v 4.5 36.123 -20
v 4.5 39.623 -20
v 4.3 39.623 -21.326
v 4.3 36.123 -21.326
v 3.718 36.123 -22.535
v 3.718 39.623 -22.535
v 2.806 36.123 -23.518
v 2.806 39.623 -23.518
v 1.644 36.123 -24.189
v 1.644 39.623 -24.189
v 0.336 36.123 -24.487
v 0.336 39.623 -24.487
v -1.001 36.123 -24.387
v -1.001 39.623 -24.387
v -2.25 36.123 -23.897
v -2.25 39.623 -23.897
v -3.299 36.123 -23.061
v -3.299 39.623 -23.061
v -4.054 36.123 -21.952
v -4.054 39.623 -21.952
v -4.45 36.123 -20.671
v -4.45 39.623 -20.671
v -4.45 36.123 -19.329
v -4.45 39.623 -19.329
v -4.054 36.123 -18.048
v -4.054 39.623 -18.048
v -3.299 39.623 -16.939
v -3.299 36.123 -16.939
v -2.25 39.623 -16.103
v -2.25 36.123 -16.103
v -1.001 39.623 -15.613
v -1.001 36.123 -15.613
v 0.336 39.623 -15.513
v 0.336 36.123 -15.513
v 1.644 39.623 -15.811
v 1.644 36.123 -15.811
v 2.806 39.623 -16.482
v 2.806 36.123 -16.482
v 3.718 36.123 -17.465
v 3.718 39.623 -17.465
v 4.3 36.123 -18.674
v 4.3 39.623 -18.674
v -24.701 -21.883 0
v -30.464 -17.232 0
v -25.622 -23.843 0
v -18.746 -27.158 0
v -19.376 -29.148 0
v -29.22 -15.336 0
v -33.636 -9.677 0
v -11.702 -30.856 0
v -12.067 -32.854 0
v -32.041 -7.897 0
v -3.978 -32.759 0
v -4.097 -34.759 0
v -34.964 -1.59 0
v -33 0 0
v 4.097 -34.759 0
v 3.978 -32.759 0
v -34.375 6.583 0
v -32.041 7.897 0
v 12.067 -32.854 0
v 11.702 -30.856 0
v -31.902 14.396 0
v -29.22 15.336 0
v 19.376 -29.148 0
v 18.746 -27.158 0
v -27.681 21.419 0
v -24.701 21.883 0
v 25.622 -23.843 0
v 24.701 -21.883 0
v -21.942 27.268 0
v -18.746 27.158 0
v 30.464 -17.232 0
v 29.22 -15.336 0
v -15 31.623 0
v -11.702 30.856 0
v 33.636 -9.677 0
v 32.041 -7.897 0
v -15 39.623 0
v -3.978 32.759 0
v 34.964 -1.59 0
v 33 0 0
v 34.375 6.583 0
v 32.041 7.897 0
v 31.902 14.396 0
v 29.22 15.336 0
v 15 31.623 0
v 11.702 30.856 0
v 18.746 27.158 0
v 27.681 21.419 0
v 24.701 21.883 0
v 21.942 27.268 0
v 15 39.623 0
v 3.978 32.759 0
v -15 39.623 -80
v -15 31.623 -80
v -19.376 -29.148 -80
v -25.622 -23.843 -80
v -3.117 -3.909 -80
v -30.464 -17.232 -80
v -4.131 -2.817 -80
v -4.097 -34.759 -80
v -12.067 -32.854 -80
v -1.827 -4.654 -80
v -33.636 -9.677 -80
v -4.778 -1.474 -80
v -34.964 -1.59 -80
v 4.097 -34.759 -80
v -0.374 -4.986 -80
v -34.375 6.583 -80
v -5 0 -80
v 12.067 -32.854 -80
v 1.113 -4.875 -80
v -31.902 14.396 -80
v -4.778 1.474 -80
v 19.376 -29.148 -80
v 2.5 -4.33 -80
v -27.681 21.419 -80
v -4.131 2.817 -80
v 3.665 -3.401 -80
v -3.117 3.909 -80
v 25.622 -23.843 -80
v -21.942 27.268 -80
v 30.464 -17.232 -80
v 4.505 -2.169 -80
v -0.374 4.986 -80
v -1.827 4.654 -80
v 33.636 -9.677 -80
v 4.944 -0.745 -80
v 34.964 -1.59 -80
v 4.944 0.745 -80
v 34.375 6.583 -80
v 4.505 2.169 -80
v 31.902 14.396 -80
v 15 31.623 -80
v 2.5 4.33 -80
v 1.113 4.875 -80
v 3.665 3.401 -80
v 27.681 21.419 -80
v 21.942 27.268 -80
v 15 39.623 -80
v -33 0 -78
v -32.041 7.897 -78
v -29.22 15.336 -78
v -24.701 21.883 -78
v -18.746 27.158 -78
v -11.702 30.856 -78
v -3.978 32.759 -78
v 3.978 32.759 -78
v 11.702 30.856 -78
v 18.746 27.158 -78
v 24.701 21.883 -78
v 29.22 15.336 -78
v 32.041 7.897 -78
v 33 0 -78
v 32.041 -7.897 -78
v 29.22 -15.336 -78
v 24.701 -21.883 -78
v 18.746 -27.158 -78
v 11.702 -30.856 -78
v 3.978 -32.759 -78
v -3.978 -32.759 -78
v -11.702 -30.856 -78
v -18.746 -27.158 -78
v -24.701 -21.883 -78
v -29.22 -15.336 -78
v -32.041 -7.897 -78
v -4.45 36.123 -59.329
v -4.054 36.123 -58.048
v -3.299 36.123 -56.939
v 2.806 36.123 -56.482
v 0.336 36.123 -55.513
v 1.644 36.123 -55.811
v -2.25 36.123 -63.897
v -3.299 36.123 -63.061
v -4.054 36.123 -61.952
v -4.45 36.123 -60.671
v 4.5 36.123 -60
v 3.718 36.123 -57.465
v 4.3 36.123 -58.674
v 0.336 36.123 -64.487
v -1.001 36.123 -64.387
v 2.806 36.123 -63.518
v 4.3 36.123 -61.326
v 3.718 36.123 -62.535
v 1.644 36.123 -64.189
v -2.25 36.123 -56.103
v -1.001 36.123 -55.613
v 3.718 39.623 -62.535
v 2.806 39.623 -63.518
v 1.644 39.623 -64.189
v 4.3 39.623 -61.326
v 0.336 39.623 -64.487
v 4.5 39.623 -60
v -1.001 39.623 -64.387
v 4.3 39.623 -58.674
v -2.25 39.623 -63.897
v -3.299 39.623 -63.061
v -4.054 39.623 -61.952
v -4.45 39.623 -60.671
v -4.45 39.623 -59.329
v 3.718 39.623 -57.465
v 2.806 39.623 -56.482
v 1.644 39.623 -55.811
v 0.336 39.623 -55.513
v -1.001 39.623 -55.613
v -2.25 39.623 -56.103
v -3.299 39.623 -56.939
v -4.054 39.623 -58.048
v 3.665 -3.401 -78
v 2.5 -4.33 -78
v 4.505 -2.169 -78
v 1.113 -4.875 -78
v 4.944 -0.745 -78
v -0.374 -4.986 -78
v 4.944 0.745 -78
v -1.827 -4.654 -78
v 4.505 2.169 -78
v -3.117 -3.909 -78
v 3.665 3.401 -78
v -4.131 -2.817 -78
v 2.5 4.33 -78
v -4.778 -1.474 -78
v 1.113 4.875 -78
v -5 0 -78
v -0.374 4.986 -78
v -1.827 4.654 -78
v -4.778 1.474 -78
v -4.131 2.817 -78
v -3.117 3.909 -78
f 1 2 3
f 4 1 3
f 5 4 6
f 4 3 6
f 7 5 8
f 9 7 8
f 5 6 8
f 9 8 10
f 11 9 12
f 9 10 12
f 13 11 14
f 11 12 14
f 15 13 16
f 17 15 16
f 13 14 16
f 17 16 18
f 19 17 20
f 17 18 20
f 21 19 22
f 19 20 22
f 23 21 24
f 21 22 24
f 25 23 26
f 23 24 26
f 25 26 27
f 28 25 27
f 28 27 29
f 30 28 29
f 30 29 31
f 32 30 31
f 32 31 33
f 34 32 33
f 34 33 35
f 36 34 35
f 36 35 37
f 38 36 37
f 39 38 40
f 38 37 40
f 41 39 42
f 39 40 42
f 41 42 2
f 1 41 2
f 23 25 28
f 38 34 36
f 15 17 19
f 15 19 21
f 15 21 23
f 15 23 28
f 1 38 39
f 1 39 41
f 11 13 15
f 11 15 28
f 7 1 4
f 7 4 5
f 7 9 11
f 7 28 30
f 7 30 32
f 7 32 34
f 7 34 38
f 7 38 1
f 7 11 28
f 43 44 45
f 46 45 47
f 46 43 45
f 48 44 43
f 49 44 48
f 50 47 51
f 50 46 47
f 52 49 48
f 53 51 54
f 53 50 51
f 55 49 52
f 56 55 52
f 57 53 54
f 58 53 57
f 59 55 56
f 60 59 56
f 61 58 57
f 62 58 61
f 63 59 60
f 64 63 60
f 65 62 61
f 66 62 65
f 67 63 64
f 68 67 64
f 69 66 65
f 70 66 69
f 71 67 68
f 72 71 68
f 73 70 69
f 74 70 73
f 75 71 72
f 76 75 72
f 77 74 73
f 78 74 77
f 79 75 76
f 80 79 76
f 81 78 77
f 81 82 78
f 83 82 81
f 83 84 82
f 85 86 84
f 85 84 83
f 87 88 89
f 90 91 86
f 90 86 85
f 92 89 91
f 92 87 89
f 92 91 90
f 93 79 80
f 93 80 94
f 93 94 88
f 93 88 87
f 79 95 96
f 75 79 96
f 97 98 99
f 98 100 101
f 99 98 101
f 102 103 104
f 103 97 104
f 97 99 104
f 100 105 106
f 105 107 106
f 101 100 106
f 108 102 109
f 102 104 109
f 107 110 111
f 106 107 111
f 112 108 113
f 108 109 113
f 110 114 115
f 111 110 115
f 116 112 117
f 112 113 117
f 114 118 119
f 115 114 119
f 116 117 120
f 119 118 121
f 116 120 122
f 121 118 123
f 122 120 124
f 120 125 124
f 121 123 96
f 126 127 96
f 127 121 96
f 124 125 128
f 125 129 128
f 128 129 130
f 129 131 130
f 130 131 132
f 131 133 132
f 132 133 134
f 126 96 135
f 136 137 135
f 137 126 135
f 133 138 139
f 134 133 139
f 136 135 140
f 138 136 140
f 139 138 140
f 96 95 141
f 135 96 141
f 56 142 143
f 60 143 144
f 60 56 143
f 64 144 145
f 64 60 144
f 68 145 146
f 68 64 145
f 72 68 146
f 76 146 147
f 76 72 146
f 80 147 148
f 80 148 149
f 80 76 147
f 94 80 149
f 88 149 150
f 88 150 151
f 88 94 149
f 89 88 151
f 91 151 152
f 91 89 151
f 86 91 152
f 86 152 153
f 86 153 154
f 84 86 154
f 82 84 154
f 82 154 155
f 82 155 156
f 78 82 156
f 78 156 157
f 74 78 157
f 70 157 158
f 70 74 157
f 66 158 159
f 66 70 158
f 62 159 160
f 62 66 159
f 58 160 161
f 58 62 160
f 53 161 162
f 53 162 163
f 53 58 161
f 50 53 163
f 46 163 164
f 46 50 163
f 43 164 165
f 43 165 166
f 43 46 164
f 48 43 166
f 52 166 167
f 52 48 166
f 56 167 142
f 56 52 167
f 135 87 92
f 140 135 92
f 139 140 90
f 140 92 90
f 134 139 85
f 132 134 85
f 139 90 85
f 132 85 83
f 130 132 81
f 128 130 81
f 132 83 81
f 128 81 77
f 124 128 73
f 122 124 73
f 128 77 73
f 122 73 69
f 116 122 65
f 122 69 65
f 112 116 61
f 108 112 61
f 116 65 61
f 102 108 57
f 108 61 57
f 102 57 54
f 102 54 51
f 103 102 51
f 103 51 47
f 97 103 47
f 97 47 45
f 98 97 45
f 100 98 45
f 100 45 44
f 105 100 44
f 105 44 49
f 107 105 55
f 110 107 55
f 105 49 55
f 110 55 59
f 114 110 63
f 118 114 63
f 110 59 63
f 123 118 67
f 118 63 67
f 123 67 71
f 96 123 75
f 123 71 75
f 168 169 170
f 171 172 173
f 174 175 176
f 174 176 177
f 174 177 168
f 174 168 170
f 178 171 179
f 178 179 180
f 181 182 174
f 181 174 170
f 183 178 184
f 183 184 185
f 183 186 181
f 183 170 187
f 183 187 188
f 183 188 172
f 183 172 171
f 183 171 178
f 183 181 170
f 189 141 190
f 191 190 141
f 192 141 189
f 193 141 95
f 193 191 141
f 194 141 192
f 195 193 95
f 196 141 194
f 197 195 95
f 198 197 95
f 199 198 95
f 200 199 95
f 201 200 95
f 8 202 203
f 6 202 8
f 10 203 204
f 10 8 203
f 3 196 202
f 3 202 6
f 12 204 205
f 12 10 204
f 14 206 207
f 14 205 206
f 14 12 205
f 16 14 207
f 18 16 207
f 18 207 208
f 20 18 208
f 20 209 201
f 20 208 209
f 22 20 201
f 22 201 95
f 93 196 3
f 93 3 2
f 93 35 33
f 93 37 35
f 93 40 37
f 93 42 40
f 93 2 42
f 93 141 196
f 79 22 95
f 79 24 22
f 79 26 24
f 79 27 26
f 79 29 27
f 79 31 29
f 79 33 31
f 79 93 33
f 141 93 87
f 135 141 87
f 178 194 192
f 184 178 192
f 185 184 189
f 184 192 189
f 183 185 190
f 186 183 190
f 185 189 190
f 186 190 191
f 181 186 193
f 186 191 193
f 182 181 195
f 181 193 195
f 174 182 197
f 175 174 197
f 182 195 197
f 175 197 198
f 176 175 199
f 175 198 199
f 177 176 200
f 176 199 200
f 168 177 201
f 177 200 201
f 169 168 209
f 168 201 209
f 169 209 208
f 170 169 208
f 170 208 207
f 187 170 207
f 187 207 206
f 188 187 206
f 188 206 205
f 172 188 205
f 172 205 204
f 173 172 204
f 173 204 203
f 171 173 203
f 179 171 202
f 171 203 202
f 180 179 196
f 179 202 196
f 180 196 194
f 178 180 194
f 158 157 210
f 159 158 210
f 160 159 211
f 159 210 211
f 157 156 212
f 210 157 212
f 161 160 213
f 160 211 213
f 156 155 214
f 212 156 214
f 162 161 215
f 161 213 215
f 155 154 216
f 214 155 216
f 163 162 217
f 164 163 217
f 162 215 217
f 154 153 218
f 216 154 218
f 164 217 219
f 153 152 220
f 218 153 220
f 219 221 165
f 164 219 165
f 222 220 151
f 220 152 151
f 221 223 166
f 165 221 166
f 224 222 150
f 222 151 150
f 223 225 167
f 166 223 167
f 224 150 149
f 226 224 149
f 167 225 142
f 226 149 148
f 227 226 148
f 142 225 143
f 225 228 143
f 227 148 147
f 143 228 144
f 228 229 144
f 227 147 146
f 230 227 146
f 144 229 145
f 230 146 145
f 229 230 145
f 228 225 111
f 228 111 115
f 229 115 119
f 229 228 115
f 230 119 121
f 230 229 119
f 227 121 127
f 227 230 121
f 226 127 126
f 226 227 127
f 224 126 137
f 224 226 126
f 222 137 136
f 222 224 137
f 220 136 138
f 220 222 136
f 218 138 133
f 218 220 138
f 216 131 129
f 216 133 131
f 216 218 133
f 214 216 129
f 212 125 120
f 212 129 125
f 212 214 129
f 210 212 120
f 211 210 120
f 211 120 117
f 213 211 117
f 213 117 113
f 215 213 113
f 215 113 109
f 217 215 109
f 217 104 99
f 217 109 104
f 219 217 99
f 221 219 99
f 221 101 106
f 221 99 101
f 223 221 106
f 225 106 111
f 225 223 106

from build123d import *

# Parameters (mm, degrees)
PAD_DEPTH            = 80
SKETCH001_R          = 33
POCKET_DEPTH         = 78
SKETCH002_R          = 5
POCKET001_DEPTH      = 80.001
SKETCH003_R          = 4.5
POCKET002_DEPTH      = 3.5
LINEARPATTERN_COUNT  = 2
LINEARPATTERN_PITCH  = 40
BODY_PLACEMENT_ANGLE = 180


with BuildPart() as part:
    # Sketch → Pad (new body)
    with BuildSketch(Plane.XY):
        with BuildLine():
            Line((-15, 39.622777), (15, 39.622777))
            Line((15, 39.622777), (15, 31.622777))
            ThreePointArc((-15, 31.622777), (0, -35), (15, 31.622777))
            Line((-15, 39.622777), (-15, 31.622777))
        make_face()
    extrude(amount=PAD_DEPTH)

    # Sketch001 → Pocket (cut)
    with BuildSketch(Plane.XY):
        Circle(SKETCH001_R)
    extrude(amount=POCKET_DEPTH, mode=Mode.SUBTRACT)

    # Sketch002 → Pocket001 (cut, through all)
    with BuildSketch(Plane.XY):
        Circle(SKETCH002_R)
    extrude(amount=POCKET001_DEPTH, mode=Mode.SUBTRACT)

    # Sketch003 (on Face1 of Pocket001) → Pocket002 (cut)
    with BuildSketch(Plane(origin=(0, 39.622777, 0), x_dir=(-1, 0, 0), z_dir=(0, 1, 0))):
        with Locations((0, 20)):
            Circle(SKETCH003_R)
    pocket002 = extrude(amount=-POCKET002_DEPTH, mode=Mode.SUBTRACT)

    # LinearPattern: Pocket002 ×2
    with Locations(*[(0, 0, i * LINEARPATTERN_PITCH) for i in range(1, LINEARPATTERN_COUNT)]):
        add(pocket002, mode=Mode.SUBTRACT)


with BuildPart() as part_1:
    # Body placement: moved
    add(part.part.rotate(Axis((0, 0, 0), (0, 1, 0)), BODY_PLACEMENT_ANGLE))


solid = part_1.part
